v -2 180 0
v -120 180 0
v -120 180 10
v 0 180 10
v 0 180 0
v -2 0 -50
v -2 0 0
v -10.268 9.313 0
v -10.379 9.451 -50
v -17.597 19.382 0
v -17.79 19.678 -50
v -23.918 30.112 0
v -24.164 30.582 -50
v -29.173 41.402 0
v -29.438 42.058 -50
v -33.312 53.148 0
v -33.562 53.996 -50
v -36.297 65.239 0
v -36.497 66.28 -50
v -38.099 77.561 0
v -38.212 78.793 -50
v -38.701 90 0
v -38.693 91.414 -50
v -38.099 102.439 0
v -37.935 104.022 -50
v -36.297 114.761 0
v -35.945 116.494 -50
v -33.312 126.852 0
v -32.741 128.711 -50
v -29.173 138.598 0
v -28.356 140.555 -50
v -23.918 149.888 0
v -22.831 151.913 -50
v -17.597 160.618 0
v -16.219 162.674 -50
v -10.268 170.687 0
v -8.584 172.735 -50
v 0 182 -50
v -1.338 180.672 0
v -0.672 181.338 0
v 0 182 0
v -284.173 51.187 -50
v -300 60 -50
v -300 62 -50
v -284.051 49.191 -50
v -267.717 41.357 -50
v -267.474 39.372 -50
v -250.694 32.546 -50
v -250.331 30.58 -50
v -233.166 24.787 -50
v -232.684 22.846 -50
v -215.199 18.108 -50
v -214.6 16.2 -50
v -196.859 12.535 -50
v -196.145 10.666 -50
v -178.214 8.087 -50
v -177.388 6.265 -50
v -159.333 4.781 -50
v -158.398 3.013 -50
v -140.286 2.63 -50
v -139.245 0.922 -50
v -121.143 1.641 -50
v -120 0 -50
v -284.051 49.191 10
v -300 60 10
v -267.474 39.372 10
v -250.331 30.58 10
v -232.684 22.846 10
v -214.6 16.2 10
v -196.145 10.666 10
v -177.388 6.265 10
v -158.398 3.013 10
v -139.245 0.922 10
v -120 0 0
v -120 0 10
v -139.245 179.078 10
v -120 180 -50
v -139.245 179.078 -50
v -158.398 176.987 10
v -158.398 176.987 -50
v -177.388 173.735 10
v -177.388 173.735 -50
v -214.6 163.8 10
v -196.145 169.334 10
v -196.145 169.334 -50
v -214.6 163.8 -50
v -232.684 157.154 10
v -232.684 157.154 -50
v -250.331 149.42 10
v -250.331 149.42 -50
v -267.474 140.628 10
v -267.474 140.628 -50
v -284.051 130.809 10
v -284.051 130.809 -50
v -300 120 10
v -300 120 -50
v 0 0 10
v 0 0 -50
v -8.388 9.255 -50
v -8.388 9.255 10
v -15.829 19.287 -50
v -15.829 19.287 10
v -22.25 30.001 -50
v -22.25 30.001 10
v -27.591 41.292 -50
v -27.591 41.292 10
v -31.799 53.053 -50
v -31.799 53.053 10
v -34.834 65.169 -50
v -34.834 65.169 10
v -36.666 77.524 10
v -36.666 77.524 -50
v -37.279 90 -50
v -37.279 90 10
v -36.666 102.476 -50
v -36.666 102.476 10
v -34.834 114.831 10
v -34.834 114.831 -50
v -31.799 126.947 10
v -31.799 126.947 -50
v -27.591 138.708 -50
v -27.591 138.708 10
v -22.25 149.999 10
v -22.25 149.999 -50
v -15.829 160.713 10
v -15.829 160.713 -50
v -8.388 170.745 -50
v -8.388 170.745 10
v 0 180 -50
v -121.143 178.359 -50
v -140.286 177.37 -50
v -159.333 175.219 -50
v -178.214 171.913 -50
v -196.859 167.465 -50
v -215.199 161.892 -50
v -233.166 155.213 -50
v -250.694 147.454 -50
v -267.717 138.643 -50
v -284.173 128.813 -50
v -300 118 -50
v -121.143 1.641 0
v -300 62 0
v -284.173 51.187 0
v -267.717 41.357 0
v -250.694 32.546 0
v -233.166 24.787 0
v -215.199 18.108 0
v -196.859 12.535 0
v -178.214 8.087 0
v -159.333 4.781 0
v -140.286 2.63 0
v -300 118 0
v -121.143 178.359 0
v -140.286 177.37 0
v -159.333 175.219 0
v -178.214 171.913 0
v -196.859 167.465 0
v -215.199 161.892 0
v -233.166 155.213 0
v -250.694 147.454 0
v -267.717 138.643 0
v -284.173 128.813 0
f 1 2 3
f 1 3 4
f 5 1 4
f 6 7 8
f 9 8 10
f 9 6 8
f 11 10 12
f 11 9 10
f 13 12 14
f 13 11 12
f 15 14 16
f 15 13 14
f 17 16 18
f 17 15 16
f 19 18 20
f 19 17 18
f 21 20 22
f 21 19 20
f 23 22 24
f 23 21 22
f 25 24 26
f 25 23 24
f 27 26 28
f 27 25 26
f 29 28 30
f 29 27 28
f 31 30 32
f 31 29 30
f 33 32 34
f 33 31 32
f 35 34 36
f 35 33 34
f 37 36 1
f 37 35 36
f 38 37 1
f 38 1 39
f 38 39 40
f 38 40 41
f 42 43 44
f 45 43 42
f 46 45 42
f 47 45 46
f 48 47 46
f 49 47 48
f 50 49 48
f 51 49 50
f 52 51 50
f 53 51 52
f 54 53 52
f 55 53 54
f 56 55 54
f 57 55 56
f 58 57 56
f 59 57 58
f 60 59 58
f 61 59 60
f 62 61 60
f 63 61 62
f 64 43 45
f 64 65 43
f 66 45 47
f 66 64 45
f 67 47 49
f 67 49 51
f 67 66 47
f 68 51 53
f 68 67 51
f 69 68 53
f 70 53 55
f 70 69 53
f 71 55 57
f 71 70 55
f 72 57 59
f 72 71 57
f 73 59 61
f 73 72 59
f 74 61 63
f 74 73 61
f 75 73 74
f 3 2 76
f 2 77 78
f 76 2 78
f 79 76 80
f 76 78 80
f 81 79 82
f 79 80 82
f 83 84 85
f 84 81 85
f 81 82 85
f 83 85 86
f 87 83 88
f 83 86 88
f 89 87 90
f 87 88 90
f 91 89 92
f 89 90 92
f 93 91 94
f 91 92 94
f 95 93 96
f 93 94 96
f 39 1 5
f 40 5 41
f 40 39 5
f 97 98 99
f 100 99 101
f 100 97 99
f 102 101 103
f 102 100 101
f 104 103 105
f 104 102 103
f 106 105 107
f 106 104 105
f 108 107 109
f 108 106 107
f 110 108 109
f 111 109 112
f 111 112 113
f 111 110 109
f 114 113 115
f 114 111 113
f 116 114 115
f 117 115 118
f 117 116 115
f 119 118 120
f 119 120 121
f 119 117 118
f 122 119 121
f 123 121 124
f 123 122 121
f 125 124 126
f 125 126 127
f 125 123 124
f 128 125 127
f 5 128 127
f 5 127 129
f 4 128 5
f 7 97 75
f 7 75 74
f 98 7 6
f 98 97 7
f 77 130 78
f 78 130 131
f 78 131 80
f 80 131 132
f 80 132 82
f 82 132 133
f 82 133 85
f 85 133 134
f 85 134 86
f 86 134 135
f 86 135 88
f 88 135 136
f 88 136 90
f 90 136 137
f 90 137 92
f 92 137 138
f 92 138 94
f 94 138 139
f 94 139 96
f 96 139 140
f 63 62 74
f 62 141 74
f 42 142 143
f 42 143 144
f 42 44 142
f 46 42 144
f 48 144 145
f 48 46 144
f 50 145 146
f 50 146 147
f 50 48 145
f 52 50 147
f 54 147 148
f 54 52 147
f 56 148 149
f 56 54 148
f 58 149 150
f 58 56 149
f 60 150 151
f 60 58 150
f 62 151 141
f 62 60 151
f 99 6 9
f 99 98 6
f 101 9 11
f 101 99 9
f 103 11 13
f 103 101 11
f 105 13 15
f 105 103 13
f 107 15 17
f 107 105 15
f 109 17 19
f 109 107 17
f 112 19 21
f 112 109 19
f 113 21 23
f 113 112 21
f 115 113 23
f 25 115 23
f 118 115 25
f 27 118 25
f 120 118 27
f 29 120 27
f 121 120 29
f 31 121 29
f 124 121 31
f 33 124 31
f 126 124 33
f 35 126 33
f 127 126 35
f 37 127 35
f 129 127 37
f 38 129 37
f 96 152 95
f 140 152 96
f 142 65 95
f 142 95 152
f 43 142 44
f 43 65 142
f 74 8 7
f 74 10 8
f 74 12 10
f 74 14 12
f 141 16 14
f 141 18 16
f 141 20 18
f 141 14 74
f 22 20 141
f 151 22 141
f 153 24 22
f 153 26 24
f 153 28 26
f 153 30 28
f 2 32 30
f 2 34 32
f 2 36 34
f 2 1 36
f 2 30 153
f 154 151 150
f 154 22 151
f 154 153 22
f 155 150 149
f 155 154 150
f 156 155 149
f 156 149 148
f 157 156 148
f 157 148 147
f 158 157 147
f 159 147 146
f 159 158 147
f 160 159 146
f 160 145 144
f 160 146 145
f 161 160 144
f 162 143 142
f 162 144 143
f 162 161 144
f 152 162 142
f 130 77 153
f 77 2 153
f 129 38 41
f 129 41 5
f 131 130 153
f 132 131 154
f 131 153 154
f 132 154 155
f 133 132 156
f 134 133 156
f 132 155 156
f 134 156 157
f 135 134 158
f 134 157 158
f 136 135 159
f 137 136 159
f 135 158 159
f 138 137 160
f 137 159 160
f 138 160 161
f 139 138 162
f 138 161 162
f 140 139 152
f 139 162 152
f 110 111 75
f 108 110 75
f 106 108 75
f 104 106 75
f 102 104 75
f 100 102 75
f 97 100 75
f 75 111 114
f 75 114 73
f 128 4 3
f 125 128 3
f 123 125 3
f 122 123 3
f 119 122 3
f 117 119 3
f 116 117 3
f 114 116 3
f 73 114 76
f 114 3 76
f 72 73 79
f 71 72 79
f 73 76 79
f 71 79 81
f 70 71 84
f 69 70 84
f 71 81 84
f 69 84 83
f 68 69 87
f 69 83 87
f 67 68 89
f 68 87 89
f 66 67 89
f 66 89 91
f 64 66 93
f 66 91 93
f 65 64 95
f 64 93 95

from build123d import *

# Parameters (mm, degrees)
BOSS_EXTRUDE1_DEPTH = 10
SKETCH3_W           = 50
SKETCH3_H           = 2
SKETCH4_W           = 50
SKETCH4_H           = 2


with BuildPart() as part:
    # Sketch1 → Boss-Extrude1 (new body)
    with BuildSketch(Plane.XY):
        with BuildLine():
            Line((0, 0), (-120, 0))
            ThreePointArc((-120, 0), (-214.59995491, 16.200135269), (-300, 60))
            Line((-300, 60), (-300, 120))
            ThreePointArc((-300, 120), (-214.59995491, 163.799864731), (-120, 180))
            Line((-120, 180), (0, 180))
            ThreePointArc((0, 180), (-37.279220614, 90), (0, 0))
        make_face()
    extrude(amount=BOSS_EXTRUDE1_DEPTH)

    # Sweep2: sweep along a curve in space
    with BuildLine() as sweep2_path:
        ThreePointArc((0, 0, 0), (-37.279220614, 90, 0), (0, 180, 0))
    # 3DSketch2 → Sweep2 (sweep)
    with BuildSketch(Plane(origin=(0, 0, 0), x_dir=(-0.03996803834887158, 0, -0.9992009587217895), z_dir=(0, -1, 0))):
        Polygon((0, 0), (49.960047936, 1.998401917), (50.039984013, 0), (0.079936077, -1.998401917), align=None)
    sweep(path=sweep2_path.line)

    # Sweep3: sweep along a curve in space
    with BuildLine() as sweep3_path:
        ThreePointArc((-300, 60, 0), (-214.59995491, 16.200135269, 0), (-120, 0, 0))
    # Sketch3 → Sweep3 (sweep)
    with BuildSketch(Plane.ZY.offset(300)):
        with Locations((-25, 61)):
            Rectangle(SKETCH3_W, SKETCH3_H)
    sweep(path=sweep3_path.line)

    # Sweep4: sweep along a curve in space
    with BuildLine() as sweep4_path:
        ThreePointArc((-120, 180, 0), (-214.59995491, 163.799864731, 0), (-300, 120, 0))
    # Sketch4 → Sweep4 (sweep)
    with BuildSketch(Plane.ZY.offset(300)):
        with Locations((-25, 119)):
            Rectangle(SKETCH4_W, SKETCH4_H)
    sweep(path=sweep4_path.line)


solid = part.part
